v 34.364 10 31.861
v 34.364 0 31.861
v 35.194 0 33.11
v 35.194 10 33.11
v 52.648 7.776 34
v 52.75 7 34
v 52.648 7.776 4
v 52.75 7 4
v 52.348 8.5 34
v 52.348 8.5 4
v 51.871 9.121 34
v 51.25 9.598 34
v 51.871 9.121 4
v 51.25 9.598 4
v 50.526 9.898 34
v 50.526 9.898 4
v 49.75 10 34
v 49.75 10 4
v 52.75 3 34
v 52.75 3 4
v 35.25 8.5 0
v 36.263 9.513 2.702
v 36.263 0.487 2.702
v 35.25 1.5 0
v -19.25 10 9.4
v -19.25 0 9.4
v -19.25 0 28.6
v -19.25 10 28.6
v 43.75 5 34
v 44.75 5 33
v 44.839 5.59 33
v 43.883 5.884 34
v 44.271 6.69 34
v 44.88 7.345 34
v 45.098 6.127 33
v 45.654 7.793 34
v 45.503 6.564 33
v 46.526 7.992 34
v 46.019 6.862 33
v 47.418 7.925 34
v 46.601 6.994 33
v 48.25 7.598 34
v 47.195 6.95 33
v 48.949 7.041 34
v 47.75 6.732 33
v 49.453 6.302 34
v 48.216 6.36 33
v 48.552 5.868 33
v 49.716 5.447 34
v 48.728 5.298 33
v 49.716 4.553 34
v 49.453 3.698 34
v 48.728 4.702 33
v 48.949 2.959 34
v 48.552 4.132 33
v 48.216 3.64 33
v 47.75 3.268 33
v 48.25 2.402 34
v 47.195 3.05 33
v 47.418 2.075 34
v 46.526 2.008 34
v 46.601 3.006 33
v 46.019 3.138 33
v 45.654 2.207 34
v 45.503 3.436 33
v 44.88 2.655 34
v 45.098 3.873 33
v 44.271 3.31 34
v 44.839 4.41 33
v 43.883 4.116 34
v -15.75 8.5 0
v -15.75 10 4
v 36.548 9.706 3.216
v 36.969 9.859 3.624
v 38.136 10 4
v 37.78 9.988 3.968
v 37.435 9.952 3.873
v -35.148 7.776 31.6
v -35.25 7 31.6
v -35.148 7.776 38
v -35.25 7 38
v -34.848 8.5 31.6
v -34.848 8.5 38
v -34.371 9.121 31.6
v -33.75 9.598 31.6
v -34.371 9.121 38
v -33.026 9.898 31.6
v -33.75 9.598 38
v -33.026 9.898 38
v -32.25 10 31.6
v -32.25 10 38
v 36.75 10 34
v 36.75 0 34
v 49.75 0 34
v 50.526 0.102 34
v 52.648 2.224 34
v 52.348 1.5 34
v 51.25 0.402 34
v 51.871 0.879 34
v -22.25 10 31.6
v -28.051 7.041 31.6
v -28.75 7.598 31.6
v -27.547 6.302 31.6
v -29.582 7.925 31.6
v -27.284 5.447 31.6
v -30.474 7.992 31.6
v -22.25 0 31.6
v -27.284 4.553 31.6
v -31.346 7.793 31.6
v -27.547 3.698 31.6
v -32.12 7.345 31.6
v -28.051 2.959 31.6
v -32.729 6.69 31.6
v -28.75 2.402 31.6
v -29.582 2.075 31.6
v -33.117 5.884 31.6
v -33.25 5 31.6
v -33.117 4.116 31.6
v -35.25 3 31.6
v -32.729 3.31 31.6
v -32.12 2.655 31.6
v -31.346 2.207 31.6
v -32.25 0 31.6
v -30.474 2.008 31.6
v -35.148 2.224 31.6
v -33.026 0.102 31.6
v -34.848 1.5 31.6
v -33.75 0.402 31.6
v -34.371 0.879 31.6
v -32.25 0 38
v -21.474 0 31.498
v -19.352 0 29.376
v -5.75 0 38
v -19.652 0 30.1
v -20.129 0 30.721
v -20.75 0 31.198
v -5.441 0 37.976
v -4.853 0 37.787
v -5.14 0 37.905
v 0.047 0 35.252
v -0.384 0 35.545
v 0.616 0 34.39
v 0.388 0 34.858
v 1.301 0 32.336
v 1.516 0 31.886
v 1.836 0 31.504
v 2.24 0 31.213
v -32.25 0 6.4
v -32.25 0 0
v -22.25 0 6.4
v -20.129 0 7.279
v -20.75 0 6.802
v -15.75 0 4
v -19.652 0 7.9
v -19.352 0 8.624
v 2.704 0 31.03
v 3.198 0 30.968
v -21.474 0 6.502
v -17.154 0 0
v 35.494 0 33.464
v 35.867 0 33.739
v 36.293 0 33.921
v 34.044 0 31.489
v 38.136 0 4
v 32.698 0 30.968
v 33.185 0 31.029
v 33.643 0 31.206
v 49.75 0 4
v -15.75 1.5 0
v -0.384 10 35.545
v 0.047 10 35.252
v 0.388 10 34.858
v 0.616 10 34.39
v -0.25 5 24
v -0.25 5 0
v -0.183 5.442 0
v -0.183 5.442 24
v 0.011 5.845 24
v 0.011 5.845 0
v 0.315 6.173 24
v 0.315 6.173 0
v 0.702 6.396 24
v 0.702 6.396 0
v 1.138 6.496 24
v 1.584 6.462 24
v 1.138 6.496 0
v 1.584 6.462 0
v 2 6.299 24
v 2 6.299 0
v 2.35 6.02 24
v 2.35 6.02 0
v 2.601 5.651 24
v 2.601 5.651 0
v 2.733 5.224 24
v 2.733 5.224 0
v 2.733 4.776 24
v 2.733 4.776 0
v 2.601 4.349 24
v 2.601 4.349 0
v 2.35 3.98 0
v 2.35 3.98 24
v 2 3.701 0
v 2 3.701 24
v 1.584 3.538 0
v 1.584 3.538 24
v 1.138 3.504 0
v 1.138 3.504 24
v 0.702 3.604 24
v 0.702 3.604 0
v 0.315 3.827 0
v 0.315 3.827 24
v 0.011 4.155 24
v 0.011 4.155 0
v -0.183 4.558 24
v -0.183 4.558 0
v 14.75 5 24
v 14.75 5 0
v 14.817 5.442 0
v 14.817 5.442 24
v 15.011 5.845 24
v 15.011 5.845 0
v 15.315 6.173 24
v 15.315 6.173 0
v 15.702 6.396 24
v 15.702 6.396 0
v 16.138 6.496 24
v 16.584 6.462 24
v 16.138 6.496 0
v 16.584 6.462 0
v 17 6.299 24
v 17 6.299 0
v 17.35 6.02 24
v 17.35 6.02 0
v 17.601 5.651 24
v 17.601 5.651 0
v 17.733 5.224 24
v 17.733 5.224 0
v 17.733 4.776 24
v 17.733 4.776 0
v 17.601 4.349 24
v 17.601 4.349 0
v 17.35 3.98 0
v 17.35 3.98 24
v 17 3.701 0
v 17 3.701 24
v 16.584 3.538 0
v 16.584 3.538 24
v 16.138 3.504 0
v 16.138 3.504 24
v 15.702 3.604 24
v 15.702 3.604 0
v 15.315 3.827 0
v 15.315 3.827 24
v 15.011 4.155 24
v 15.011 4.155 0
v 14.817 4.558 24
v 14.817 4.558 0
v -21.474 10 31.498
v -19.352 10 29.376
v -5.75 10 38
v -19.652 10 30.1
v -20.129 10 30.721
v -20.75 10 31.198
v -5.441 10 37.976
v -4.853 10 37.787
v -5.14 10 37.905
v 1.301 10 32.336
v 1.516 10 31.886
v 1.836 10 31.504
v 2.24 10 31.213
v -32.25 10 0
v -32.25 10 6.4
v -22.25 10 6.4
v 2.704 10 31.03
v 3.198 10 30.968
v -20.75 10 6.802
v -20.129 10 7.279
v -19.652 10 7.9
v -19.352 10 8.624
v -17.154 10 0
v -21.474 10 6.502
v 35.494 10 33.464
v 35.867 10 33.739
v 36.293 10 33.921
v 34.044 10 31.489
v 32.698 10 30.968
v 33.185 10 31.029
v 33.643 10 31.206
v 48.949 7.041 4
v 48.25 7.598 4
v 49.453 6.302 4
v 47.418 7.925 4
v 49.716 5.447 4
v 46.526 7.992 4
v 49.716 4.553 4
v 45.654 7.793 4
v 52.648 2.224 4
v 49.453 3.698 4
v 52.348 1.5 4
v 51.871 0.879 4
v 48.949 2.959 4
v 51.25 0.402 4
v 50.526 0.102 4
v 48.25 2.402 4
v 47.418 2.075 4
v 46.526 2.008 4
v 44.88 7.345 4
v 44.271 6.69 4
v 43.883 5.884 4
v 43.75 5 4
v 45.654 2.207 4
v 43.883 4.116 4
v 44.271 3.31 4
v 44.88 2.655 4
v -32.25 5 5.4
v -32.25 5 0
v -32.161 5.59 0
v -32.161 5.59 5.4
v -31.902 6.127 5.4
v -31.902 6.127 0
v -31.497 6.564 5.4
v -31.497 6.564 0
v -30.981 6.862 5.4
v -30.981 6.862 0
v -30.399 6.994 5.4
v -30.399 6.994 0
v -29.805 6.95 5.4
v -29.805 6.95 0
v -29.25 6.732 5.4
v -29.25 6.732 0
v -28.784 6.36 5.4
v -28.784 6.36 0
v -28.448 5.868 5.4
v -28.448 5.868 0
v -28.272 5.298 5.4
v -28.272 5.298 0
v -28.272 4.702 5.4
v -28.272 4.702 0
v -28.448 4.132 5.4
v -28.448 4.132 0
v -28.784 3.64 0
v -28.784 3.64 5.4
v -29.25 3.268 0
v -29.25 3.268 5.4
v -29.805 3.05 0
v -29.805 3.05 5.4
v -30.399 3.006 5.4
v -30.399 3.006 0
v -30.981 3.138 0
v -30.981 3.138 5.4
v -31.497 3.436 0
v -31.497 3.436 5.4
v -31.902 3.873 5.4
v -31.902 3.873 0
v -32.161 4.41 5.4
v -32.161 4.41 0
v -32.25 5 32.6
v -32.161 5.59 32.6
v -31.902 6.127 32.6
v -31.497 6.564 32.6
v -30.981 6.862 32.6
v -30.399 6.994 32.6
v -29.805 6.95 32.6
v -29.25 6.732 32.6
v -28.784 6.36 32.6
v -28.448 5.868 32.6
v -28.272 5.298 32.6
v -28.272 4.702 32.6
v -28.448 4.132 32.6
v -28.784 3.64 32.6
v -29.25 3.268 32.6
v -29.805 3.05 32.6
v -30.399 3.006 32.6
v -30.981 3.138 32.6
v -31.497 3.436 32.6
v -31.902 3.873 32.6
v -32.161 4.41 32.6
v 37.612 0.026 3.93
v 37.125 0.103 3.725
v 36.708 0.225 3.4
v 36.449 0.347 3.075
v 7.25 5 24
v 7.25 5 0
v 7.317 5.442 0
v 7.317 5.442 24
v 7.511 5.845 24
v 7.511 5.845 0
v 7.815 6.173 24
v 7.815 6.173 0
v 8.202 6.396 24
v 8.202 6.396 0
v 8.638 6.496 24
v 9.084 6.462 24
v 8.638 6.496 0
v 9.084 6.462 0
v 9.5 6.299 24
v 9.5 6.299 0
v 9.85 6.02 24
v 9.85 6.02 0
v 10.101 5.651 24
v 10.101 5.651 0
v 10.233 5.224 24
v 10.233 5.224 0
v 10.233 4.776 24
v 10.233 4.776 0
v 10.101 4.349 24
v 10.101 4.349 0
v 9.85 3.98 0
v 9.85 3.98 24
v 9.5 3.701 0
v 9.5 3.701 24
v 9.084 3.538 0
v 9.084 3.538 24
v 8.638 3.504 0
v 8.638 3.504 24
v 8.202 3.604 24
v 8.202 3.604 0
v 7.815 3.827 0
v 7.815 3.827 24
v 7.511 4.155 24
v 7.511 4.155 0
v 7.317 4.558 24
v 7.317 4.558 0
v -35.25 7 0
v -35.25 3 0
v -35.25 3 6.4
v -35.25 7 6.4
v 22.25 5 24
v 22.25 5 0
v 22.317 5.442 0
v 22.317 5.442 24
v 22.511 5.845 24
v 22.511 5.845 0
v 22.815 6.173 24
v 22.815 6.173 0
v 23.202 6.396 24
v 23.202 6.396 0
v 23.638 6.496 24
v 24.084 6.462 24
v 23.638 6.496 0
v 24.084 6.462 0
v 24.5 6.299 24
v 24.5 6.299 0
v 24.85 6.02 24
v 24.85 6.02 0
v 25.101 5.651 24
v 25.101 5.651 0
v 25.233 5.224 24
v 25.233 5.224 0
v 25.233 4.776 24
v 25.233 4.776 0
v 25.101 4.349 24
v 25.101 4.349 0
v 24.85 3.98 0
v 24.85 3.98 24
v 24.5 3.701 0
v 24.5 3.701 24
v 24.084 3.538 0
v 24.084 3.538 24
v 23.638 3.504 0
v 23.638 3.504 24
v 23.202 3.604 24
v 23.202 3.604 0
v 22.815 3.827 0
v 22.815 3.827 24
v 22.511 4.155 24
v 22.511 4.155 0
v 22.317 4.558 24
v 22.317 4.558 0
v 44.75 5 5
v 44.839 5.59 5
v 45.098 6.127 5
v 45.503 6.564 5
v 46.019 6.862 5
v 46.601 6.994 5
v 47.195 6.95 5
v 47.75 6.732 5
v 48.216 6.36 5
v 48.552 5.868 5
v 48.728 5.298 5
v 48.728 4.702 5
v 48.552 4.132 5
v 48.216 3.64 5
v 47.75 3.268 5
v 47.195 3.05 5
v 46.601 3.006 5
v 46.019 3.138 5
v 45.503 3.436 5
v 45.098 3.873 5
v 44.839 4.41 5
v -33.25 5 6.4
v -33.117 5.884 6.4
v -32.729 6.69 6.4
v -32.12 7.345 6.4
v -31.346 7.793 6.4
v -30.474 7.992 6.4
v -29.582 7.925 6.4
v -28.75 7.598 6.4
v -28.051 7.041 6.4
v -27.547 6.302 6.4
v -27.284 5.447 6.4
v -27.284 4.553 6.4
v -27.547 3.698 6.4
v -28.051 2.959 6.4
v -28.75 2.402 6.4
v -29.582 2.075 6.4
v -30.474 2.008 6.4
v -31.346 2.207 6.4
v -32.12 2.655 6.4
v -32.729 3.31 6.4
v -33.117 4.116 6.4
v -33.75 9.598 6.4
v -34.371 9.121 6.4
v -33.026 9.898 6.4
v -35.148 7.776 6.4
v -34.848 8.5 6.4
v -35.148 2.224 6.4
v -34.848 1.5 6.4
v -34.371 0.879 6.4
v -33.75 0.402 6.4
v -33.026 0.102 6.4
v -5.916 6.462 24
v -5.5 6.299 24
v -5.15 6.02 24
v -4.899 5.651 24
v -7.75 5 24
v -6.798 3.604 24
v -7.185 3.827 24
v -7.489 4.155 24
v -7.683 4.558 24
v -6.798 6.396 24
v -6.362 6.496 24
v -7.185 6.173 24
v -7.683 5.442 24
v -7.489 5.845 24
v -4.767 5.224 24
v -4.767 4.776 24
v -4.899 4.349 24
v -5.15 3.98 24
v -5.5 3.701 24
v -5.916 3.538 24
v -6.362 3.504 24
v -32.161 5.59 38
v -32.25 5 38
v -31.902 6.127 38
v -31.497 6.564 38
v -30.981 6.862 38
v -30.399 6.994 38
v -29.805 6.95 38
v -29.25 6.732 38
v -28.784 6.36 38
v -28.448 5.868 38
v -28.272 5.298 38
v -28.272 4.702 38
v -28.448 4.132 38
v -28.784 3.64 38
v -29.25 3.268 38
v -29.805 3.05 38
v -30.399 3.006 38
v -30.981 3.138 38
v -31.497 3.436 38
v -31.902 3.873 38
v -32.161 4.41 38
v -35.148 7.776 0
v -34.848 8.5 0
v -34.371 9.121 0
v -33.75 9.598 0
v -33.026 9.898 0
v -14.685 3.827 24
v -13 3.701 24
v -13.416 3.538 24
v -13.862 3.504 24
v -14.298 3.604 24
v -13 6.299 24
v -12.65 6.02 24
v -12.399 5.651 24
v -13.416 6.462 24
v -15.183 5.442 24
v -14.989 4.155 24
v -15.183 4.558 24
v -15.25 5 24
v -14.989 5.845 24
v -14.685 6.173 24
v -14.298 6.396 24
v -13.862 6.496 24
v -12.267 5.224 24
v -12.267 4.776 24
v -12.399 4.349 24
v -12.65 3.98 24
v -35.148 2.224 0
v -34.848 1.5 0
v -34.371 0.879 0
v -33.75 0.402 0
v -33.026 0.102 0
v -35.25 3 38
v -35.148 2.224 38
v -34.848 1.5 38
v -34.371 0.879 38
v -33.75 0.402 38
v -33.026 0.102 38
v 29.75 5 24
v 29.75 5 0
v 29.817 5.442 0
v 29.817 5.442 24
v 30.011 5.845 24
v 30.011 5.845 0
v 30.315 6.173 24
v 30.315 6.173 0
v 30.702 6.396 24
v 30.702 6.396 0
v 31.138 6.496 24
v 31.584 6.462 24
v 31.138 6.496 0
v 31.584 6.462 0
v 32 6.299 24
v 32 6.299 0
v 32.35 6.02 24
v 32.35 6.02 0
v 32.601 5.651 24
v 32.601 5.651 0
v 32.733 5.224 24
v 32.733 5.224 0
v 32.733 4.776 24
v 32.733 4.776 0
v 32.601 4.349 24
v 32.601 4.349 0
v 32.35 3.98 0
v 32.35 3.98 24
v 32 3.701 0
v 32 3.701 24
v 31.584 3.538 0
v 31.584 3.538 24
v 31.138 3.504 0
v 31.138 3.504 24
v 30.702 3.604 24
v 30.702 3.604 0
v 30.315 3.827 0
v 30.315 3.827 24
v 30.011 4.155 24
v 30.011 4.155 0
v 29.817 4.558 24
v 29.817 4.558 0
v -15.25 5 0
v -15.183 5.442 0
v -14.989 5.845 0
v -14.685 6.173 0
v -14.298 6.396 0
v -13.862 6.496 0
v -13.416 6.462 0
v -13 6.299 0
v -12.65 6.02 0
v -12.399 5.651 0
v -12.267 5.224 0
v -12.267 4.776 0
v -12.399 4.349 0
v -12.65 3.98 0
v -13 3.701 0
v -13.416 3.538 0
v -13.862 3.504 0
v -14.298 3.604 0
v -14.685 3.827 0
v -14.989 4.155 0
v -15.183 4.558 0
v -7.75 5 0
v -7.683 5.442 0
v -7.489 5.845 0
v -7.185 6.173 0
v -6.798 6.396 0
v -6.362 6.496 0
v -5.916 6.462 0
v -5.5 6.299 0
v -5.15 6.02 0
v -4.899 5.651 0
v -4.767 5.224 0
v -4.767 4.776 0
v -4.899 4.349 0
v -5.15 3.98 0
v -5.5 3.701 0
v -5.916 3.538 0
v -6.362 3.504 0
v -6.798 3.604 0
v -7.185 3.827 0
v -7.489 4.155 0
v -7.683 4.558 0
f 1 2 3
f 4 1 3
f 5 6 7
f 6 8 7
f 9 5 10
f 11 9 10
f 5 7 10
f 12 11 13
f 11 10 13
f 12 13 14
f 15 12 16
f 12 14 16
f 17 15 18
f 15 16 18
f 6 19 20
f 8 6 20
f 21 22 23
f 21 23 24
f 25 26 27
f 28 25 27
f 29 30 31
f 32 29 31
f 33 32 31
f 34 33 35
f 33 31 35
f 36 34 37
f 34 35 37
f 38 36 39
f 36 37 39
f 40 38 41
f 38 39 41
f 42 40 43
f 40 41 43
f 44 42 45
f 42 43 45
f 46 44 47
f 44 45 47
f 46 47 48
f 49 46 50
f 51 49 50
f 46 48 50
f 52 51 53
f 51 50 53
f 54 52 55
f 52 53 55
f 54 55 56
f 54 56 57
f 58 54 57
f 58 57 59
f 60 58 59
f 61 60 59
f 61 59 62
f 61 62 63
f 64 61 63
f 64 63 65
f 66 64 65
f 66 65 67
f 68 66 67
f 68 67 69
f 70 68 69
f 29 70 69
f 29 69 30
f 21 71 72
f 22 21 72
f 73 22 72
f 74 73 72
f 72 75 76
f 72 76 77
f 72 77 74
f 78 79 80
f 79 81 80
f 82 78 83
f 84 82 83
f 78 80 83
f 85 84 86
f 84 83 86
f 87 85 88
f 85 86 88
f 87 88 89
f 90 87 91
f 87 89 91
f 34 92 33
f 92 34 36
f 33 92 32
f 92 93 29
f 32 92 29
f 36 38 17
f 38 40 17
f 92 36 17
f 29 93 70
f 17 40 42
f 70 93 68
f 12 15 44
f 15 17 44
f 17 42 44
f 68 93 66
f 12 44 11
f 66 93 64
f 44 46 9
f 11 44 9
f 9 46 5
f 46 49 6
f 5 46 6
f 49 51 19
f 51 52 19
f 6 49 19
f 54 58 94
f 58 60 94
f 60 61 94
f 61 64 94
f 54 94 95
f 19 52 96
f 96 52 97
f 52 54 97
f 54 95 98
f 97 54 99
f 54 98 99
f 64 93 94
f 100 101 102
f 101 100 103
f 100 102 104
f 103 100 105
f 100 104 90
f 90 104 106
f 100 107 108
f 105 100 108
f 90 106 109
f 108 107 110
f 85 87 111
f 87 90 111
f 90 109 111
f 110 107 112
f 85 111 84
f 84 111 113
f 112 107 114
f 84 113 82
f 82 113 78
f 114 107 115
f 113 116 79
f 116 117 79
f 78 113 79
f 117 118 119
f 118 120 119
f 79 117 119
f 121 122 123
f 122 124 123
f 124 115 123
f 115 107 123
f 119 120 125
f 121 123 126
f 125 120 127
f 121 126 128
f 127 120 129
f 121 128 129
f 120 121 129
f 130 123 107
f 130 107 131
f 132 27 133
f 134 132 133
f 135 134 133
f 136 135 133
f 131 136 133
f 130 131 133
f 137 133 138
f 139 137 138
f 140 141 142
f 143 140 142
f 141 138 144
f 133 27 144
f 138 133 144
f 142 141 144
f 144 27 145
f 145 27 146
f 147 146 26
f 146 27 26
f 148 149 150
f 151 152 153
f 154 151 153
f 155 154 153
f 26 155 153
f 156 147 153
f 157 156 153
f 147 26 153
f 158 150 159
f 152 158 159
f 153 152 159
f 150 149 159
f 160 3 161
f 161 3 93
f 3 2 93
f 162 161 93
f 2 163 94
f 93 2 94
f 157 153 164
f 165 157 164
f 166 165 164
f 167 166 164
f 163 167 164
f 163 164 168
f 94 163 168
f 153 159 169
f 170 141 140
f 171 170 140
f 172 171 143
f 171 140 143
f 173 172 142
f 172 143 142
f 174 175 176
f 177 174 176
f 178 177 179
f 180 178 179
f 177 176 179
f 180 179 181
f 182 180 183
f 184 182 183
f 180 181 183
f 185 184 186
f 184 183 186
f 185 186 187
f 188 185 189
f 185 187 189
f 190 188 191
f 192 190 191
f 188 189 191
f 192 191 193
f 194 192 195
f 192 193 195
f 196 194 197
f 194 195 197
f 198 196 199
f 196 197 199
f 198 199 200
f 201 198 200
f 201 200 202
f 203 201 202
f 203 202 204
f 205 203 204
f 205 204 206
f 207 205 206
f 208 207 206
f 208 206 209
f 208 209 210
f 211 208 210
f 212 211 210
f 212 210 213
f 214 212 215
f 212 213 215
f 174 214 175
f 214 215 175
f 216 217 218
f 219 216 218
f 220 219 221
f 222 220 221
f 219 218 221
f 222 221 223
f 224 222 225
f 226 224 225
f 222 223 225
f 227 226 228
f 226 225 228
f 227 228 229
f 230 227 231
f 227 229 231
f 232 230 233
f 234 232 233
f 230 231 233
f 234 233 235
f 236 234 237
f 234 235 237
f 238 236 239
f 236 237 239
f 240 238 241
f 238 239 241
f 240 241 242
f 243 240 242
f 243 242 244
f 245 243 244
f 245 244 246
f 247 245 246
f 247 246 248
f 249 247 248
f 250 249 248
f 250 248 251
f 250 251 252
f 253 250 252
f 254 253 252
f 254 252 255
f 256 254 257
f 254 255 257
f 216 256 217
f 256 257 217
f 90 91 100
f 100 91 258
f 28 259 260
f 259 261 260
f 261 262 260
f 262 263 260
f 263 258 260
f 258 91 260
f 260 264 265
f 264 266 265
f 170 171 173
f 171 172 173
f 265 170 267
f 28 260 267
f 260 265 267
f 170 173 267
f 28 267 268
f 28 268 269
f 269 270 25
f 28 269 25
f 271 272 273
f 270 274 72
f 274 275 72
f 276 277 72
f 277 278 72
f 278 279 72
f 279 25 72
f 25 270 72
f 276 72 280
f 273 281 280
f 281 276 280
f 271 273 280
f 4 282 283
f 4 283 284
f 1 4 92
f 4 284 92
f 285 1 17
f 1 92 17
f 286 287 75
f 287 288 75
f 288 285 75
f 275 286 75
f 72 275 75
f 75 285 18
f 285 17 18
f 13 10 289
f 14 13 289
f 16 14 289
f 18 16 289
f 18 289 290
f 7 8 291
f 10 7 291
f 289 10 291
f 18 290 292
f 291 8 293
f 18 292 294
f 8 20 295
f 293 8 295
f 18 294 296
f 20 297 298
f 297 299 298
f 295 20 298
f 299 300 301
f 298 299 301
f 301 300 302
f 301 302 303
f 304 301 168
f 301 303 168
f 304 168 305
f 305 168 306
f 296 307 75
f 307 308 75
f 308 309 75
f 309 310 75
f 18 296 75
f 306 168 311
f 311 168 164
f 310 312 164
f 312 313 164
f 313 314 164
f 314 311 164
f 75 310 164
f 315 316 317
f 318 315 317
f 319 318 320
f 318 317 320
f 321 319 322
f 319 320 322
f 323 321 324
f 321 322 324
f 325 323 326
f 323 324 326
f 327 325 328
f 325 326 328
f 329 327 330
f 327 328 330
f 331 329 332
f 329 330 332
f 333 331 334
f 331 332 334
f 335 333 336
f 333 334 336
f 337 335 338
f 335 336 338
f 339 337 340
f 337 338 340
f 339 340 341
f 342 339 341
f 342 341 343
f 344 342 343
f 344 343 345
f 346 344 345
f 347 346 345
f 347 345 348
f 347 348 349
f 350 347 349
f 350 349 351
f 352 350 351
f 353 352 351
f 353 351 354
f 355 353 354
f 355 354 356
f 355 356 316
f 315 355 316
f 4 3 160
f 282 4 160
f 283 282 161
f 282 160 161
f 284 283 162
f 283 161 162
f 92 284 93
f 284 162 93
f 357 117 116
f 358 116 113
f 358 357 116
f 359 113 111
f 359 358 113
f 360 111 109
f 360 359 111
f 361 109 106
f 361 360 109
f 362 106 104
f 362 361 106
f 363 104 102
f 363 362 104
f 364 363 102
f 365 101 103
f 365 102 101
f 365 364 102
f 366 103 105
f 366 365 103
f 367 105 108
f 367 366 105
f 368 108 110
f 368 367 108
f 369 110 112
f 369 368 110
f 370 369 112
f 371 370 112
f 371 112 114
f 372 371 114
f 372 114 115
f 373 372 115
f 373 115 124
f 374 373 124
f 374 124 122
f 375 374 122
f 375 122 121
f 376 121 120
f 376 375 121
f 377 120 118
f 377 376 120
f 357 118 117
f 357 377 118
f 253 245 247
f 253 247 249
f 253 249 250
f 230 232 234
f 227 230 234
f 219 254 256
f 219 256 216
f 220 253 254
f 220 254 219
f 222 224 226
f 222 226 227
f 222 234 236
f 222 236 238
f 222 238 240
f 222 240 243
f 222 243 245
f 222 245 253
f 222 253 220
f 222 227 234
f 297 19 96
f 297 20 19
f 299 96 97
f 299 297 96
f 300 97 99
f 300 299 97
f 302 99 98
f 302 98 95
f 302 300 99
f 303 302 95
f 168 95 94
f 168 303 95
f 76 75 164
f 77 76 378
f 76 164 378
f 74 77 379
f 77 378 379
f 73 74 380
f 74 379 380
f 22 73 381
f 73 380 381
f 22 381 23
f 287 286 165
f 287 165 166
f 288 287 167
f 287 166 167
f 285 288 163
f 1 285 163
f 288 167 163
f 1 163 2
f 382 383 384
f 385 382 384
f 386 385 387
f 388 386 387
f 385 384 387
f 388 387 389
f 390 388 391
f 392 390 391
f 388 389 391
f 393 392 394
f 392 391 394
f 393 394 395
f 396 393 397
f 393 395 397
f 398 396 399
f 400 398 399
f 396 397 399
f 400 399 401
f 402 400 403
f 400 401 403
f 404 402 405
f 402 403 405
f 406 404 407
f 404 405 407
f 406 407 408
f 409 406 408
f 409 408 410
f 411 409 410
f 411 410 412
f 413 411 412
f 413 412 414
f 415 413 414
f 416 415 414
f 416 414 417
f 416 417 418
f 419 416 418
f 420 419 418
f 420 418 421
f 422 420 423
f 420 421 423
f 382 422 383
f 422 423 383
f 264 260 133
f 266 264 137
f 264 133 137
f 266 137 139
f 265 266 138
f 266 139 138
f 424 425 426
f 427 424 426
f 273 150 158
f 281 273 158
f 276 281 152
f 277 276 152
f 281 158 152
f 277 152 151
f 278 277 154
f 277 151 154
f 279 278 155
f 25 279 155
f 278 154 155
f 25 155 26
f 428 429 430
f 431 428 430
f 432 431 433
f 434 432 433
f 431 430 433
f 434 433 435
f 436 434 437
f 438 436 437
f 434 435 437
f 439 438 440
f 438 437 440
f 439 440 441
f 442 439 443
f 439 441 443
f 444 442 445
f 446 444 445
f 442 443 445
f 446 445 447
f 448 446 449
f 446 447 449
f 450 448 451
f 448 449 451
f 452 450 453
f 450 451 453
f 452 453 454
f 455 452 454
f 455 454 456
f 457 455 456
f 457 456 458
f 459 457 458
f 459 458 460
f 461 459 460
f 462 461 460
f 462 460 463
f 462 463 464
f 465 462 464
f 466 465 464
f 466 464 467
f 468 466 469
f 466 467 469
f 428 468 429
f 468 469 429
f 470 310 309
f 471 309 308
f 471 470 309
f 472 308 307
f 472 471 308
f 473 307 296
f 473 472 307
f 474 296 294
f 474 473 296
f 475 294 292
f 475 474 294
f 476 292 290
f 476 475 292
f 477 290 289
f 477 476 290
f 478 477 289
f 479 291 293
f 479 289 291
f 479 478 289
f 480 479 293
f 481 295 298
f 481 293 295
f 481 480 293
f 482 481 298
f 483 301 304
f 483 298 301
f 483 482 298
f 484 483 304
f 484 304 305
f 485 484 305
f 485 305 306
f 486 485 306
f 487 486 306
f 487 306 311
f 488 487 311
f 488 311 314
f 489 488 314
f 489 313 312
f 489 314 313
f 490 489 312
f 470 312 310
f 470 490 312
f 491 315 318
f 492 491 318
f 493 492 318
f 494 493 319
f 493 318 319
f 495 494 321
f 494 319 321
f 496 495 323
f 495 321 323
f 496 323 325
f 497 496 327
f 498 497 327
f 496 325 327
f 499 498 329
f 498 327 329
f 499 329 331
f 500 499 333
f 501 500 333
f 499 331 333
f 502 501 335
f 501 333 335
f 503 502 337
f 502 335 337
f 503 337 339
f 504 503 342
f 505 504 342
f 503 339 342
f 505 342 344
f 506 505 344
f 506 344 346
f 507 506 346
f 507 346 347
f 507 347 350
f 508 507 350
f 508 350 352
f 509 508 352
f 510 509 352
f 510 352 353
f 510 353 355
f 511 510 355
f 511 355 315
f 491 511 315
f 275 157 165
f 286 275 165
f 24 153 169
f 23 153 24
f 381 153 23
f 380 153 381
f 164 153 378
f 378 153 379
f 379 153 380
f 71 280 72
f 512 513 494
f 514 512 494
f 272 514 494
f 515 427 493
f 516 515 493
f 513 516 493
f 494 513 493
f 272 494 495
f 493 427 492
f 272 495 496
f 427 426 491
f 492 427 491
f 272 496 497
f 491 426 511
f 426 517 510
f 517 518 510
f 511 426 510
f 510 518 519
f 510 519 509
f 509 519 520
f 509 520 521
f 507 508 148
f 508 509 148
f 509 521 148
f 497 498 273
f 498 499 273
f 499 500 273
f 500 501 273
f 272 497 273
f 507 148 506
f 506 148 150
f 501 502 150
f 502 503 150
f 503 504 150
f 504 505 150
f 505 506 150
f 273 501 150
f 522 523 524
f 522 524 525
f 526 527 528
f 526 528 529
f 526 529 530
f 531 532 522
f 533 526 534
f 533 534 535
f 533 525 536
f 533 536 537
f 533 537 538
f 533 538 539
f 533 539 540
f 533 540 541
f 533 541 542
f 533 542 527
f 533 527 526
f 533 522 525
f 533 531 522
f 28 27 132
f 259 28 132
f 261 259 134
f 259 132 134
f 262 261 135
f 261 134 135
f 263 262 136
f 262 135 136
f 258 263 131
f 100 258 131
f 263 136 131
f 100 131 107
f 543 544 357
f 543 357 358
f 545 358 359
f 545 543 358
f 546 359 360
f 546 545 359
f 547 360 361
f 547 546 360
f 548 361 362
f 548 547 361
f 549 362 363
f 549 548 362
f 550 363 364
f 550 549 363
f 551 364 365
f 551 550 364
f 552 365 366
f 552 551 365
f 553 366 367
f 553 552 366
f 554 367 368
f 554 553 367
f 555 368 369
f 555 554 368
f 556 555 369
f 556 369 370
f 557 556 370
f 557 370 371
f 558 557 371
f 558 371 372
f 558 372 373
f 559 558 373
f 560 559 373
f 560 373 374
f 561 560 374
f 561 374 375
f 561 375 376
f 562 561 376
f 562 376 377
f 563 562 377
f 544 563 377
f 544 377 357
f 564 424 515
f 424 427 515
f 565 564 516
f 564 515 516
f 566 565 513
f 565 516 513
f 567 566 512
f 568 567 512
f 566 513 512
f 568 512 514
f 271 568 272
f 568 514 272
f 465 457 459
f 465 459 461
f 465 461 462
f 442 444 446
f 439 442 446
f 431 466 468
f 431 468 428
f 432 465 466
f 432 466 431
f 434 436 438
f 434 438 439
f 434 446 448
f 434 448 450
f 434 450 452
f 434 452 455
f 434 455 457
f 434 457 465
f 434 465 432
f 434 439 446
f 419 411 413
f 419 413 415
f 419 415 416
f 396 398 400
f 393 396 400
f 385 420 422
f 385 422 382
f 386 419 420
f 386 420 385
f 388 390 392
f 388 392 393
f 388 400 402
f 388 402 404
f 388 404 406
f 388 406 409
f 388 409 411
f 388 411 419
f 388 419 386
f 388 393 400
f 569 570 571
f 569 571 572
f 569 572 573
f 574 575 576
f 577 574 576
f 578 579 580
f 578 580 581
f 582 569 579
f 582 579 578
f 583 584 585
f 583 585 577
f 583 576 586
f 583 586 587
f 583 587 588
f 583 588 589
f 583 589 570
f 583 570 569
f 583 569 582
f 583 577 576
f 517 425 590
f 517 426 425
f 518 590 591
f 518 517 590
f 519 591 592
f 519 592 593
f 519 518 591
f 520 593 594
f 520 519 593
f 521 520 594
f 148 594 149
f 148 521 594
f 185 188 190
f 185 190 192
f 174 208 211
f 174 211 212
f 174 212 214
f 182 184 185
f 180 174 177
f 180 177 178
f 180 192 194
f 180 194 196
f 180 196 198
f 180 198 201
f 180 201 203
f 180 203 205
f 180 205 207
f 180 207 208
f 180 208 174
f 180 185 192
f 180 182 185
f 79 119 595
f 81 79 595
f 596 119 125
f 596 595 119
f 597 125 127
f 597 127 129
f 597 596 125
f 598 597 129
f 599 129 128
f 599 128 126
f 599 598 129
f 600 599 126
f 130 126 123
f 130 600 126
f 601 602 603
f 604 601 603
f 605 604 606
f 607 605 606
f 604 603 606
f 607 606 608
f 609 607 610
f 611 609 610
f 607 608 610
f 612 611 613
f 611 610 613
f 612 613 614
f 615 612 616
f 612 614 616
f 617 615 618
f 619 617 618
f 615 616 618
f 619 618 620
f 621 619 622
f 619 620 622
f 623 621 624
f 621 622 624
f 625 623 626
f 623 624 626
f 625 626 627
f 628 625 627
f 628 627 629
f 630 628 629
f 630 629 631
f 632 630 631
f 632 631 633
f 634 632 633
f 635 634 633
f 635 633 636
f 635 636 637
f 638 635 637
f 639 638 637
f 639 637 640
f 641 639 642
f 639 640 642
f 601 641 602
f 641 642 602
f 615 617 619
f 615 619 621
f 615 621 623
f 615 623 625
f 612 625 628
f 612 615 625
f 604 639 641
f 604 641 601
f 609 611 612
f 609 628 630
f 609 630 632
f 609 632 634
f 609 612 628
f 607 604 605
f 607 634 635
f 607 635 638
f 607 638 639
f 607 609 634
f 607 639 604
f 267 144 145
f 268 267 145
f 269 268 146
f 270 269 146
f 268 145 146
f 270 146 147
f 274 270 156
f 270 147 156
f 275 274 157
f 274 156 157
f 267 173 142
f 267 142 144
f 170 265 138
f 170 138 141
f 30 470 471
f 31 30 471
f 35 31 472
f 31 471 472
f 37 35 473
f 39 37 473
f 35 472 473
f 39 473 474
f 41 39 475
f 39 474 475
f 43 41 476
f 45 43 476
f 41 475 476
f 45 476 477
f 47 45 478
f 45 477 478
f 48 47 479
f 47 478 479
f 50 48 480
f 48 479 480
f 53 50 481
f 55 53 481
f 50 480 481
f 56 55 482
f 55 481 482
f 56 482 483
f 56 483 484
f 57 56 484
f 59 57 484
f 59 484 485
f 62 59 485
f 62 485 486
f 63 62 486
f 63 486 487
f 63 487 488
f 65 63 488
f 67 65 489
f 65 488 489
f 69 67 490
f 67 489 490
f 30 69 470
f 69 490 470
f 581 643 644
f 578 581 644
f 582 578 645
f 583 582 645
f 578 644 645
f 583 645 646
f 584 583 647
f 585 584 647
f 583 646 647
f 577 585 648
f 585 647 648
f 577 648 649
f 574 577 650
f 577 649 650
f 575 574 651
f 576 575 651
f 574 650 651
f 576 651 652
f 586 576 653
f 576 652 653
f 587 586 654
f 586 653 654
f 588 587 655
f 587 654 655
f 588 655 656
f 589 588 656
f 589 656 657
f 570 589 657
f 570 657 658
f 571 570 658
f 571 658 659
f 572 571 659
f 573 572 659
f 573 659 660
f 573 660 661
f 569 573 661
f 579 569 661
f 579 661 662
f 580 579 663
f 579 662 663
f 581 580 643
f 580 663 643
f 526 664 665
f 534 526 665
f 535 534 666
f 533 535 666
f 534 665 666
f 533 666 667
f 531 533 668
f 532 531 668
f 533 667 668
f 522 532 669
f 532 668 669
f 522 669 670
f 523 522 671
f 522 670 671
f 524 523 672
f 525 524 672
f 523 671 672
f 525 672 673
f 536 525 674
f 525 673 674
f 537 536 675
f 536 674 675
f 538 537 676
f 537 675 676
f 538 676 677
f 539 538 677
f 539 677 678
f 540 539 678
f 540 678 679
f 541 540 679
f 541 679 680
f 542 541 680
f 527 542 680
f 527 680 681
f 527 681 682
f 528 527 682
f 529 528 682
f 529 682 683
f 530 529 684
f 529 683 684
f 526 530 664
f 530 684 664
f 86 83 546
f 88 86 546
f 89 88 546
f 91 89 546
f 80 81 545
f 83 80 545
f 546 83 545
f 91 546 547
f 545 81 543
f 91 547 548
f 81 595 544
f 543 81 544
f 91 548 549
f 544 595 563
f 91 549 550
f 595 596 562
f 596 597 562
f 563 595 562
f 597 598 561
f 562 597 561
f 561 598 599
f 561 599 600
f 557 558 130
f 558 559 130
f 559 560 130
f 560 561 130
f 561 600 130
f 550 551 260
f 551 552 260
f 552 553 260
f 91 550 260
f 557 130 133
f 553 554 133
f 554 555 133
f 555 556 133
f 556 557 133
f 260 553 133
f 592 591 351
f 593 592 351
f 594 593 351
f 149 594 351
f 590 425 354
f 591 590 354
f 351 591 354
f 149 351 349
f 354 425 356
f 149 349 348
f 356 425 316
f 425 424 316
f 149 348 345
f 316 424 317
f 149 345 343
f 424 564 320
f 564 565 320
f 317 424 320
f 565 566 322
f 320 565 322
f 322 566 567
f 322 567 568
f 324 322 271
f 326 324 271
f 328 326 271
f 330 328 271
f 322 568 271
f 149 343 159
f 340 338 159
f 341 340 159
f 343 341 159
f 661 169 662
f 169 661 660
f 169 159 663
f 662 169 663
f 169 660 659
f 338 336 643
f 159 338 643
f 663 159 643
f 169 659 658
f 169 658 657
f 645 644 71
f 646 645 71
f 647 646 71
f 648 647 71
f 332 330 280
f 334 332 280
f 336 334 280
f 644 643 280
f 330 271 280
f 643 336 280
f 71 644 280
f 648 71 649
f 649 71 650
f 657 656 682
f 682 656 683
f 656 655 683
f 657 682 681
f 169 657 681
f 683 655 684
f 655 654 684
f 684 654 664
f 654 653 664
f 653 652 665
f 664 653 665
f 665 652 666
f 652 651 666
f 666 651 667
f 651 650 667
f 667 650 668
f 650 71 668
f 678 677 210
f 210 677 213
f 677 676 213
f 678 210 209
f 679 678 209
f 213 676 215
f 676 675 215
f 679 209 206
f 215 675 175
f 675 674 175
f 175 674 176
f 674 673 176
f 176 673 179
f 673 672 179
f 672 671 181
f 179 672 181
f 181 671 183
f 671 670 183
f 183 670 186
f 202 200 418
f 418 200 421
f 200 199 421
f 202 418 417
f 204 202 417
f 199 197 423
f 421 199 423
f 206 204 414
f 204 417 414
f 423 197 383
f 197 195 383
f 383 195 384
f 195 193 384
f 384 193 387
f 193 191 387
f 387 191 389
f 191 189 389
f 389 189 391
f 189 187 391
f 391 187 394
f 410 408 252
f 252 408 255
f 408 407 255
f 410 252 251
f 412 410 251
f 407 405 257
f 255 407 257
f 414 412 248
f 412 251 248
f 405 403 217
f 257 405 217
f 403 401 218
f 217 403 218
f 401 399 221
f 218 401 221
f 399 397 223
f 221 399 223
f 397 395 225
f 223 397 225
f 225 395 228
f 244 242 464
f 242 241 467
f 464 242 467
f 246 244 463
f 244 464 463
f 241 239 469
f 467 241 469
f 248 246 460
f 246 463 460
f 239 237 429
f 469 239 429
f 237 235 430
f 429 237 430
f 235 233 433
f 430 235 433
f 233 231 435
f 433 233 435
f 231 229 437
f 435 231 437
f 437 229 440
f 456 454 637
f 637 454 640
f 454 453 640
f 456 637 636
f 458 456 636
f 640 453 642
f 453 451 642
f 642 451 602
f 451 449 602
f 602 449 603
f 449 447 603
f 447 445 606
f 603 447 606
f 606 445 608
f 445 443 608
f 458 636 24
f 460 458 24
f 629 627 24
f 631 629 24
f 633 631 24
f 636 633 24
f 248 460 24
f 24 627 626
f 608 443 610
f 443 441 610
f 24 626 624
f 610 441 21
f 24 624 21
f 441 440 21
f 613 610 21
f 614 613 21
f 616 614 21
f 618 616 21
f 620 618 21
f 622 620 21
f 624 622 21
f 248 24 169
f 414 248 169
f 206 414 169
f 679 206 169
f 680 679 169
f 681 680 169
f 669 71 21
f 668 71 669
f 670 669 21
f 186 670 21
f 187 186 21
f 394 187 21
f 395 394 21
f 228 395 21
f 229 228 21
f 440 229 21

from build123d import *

# Parameters (mm, degrees)
BOSS_EXTRUDE1_DEPTH           = 10
FILLET1_R                     = 3
CUT_EXTRUDE1_DEPTH            = 55.386
CHAMFER1_SIZE                 = 1.5
MIRROR3_START                 = -3.745316975
MIRROR3_DEPTH                 = 4.272002108
CSK_FOR_M4_SFHCS1_D           = 4
CSK_FOR_M4_SFHCS1_DEPTH       = 6.4
CSK_FOR_M4_SFHCS1_CSINK_D     = 6
CSK_FOR_M4_SFHCS1_CSINK_ANGLE = 90
CSK_FOR_M4_SFHCS2_D           = 4
CSK_FOR_M4_SFHCS2_CSINK_D     = 6
CSK_FOR_M4_SFHCS2_CSINK_ANGLE = 90
SKETCH7_R                     = 1.5
CUT_EXTRUDE2_DEPTH            = 24


# Read off the part's stored shape, not the designer's step: Mirror3
with BuildPart() as part:
    # Sketch1 → Boss-Extrude1 (new body)
    with BuildSketch(Plane(origin=(0, 0, 0), x_dir=(1, 0, 0), z_dir=(0, 1, 0))):
        with BuildLine():
            Line((-35.25, 0), (-35.25, -6.4))
            Line((-35.25, -6.4), (-22.25, -6.4))
            ThreePointArc((-22.25, -6.4), (-20.128679656, -7.278679656), (-19.25, -9.4))
            Line((-19.25, -9.4), (-19.25, -28.6))
            ThreePointArc((-19.25, -28.6), (-20.128679656, -30.721320344), (-22.25, -31.6))
            Line((-22.25, -31.6), (-35.25, -31.6))
            Line((-35.25, -31.6), (-35.25, -38))
            Line((-35.25, -38), (-5.75, -38))
            ThreePointArc((-5.75, -38), (-5.289009014, -37.946146786), (-4.852843875, -37.787487311))
            Line((-4.852843875, -37.787487311), (-0.384125597, -35.544596998))
            ThreePointArc((-0.384125597, -35.544596998), (0.230625744, -35.066359782), (0.616084961, -34.389564956))
            Line((0.616084961, -34.389564956), (1.30066574, -32.33582167))
            ThreePointArc((1.30066574, -32.33582167), (2.028611742, -31.34579265), (3.198032424, -30.968276939))
            Line((3.198032424, -30.968276939), (32.698032424, -30.968276939))
            ThreePointArc((32.698032424, -30.968276939), (33.642903174, -31.205546312), (34.363585035, -31.861057674))
            Line((34.363585035, -31.861057674), (35.193999483, -33.110222133))
            ThreePointArc((35.193999483, -33.110222133), (35.866740637, -33.73918414), (36.750000973, -34.000000252))
            Line((36.750000973, -34.000000252), (52.750000973, -34.000000252))
            Line((52.750000973, -34.000000252), (52.750000973, -4.000000252))
            Line((52.750000973, -4.000000252), (38.13600074, -4.000000252))
            ThreePointArc((38.13600074, -4.000000252), (36.996810987, -3.643851433), (36.263342318, -2.702246958))
            Line((36.263342318, -2.702246958), (35.25, 0))
            Line((35.25, 0), (-35.25, 0))
        make_face()
    extrude(amount=BOSS_EXTRUDE1_DEPTH)

    # Fillet1
    fillet1_edges = [part.edges().sort_by_distance(p)[0] for p in [
        (52.750000973, 0, 19.000000252),
        (-35.25, 0, 34.8),
        (-35.25, 0, 3.2),
        (-35.25, 10, 34.8),
        (52.750000973, 10, 19.000000252),
        (-35.25, 10, 3.2),
    ]]
    fillet(fillet1_edges, radius=FILLET1_R)

    # Sketch2 → Cut-Extrude1 (cut)
    with BuildSketch(Plane(origin=(38.13600074, 0, 0), x_dir=(0, 0, -1), z_dir=(1, 0, 0))):
        Polygon((-4.000000252, 10), (0, 10), (0, 8.5), align=None)
    extrude(amount=-CUT_EXTRUDE1_DEPTH, mode=Mode.SUBTRACT)

    # Chamfer1
    # the kernel refuses this chamfer: 1.5 mm, written as the material it adds along each edge
    with BuildSketch(Plane(origin=(-17.24999926, 7.145532803, -3.611912754), x_dir=(-0.027495876610586757, 0.9359751746095561, -0.35099066837171944), z_dir=(0, 0.3511234221997007, 0.9363291848398034))) as chamfer1_piece_1_section:
        Polygon((CHAMFER1_SIZE * 0.999621916911, -CHAMFER1_SIZE * 0.0274958766106), (-CHAMFER1_SIZE * 0.0274958766106, -CHAMFER1_SIZE * 0.999621916911), (0, 0), align=None)
    chamfer1_piece_1 = extrude(amount=11.987051072, mode=Mode.PRIVATE)
    chamfer1_piece_1 = split(chamfer1_piece_1, bisect_by=Plane(origin=(-16.68097762, 9.443284972, 0), z_dir=(0, 0, 1)), keep=Keep.TOP, mode=Mode.PRIVATE)
    chamfer1_piece_1 = split(chamfer1_piece_1, bisect_by=Plane(origin=(-16.68097762, 10, 1.484573502), z_dir=(0, -1, 0)), keep=Keep.TOP, mode=Mode.PRIVATE)
    add(chamfer1_piece_1)

    # Mirror3 outline → Mirror3 (cut)
    with BuildSketch(Plane(origin=(0, 0, 0), x_dir=(1, 0, 0), z_dir=(0, 0.3511234221997011, -0.9363291848398033)).offset(MIRROR3_START)):
        Polygon((-15.74999926, -1.404493777), (40, -1.404493777), (40, 2), (-19, 2), (-19, 1.845506963), align=None)
    extrude(amount=MIRROR3_DEPTH, mode=Mode.SUBTRACT)

    # CSK for M4 SFHCS1
    with Locations(Plane.XY.offset(6.4)):
        with Locations((-30.25, 5)):
            csk_for_m4_sfhcs1 = CounterSinkHole(CSK_FOR_M4_SFHCS1_D / 2, CSK_FOR_M4_SFHCS1_CSINK_D / 2, depth=CSK_FOR_M4_SFHCS1_DEPTH, counter_sink_angle=CSK_FOR_M4_SFHCS1_CSINK_ANGLE)

    # Mirror1: CSK for M4 SFHCS1 across plane
    add(csk_for_m4_sfhcs1.mirror(Plane.XY.offset(19)), mode=Mode.SUBTRACT)

    # CSK for M4 SFHCS2 (through all)
    with Locations(Plane.XY.offset(34.000000252)):
        with Locations((46.750000973, 5)):
            csk_for_m4_sfhcs2 = CounterSinkHole(CSK_FOR_M4_SFHCS2_D / 2, CSK_FOR_M4_SFHCS2_CSINK_D / 2, counter_sink_angle=CSK_FOR_M4_SFHCS2_CSINK_ANGLE)

    # Mirror2: CSK for M4 SFHCS2 across plane
    add(csk_for_m4_sfhcs2.mirror(Plane.XY.offset(19)), mode=Mode.SUBTRACT)

    # Sketch7 → Cut-Extrude2 (cut)
    with BuildSketch(Plane(origin=(0, 0, 0), x_dir=(-1, 0, 0), z_dir=(0, 0, -1))):
        with Locations((-31.25, 5)):
            Circle(SKETCH7_R)
        with Locations((-23.75, 5)):
            Circle(SKETCH7_R)
        with Locations((-16.25, 5)):
            Circle(SKETCH7_R)
        with Locations((-8.75, 5)):
            Circle(SKETCH7_R)
        with Locations((-1.25, 5)):
            Circle(SKETCH7_R)
        with Locations((6.25, 5)):
            Circle(SKETCH7_R)
        with Locations((13.75, 5)):
            Circle(SKETCH7_R)
    extrude(amount=-CUT_EXTRUDE2_DEPTH, mode=Mode.SUBTRACT)


solid = part.part
